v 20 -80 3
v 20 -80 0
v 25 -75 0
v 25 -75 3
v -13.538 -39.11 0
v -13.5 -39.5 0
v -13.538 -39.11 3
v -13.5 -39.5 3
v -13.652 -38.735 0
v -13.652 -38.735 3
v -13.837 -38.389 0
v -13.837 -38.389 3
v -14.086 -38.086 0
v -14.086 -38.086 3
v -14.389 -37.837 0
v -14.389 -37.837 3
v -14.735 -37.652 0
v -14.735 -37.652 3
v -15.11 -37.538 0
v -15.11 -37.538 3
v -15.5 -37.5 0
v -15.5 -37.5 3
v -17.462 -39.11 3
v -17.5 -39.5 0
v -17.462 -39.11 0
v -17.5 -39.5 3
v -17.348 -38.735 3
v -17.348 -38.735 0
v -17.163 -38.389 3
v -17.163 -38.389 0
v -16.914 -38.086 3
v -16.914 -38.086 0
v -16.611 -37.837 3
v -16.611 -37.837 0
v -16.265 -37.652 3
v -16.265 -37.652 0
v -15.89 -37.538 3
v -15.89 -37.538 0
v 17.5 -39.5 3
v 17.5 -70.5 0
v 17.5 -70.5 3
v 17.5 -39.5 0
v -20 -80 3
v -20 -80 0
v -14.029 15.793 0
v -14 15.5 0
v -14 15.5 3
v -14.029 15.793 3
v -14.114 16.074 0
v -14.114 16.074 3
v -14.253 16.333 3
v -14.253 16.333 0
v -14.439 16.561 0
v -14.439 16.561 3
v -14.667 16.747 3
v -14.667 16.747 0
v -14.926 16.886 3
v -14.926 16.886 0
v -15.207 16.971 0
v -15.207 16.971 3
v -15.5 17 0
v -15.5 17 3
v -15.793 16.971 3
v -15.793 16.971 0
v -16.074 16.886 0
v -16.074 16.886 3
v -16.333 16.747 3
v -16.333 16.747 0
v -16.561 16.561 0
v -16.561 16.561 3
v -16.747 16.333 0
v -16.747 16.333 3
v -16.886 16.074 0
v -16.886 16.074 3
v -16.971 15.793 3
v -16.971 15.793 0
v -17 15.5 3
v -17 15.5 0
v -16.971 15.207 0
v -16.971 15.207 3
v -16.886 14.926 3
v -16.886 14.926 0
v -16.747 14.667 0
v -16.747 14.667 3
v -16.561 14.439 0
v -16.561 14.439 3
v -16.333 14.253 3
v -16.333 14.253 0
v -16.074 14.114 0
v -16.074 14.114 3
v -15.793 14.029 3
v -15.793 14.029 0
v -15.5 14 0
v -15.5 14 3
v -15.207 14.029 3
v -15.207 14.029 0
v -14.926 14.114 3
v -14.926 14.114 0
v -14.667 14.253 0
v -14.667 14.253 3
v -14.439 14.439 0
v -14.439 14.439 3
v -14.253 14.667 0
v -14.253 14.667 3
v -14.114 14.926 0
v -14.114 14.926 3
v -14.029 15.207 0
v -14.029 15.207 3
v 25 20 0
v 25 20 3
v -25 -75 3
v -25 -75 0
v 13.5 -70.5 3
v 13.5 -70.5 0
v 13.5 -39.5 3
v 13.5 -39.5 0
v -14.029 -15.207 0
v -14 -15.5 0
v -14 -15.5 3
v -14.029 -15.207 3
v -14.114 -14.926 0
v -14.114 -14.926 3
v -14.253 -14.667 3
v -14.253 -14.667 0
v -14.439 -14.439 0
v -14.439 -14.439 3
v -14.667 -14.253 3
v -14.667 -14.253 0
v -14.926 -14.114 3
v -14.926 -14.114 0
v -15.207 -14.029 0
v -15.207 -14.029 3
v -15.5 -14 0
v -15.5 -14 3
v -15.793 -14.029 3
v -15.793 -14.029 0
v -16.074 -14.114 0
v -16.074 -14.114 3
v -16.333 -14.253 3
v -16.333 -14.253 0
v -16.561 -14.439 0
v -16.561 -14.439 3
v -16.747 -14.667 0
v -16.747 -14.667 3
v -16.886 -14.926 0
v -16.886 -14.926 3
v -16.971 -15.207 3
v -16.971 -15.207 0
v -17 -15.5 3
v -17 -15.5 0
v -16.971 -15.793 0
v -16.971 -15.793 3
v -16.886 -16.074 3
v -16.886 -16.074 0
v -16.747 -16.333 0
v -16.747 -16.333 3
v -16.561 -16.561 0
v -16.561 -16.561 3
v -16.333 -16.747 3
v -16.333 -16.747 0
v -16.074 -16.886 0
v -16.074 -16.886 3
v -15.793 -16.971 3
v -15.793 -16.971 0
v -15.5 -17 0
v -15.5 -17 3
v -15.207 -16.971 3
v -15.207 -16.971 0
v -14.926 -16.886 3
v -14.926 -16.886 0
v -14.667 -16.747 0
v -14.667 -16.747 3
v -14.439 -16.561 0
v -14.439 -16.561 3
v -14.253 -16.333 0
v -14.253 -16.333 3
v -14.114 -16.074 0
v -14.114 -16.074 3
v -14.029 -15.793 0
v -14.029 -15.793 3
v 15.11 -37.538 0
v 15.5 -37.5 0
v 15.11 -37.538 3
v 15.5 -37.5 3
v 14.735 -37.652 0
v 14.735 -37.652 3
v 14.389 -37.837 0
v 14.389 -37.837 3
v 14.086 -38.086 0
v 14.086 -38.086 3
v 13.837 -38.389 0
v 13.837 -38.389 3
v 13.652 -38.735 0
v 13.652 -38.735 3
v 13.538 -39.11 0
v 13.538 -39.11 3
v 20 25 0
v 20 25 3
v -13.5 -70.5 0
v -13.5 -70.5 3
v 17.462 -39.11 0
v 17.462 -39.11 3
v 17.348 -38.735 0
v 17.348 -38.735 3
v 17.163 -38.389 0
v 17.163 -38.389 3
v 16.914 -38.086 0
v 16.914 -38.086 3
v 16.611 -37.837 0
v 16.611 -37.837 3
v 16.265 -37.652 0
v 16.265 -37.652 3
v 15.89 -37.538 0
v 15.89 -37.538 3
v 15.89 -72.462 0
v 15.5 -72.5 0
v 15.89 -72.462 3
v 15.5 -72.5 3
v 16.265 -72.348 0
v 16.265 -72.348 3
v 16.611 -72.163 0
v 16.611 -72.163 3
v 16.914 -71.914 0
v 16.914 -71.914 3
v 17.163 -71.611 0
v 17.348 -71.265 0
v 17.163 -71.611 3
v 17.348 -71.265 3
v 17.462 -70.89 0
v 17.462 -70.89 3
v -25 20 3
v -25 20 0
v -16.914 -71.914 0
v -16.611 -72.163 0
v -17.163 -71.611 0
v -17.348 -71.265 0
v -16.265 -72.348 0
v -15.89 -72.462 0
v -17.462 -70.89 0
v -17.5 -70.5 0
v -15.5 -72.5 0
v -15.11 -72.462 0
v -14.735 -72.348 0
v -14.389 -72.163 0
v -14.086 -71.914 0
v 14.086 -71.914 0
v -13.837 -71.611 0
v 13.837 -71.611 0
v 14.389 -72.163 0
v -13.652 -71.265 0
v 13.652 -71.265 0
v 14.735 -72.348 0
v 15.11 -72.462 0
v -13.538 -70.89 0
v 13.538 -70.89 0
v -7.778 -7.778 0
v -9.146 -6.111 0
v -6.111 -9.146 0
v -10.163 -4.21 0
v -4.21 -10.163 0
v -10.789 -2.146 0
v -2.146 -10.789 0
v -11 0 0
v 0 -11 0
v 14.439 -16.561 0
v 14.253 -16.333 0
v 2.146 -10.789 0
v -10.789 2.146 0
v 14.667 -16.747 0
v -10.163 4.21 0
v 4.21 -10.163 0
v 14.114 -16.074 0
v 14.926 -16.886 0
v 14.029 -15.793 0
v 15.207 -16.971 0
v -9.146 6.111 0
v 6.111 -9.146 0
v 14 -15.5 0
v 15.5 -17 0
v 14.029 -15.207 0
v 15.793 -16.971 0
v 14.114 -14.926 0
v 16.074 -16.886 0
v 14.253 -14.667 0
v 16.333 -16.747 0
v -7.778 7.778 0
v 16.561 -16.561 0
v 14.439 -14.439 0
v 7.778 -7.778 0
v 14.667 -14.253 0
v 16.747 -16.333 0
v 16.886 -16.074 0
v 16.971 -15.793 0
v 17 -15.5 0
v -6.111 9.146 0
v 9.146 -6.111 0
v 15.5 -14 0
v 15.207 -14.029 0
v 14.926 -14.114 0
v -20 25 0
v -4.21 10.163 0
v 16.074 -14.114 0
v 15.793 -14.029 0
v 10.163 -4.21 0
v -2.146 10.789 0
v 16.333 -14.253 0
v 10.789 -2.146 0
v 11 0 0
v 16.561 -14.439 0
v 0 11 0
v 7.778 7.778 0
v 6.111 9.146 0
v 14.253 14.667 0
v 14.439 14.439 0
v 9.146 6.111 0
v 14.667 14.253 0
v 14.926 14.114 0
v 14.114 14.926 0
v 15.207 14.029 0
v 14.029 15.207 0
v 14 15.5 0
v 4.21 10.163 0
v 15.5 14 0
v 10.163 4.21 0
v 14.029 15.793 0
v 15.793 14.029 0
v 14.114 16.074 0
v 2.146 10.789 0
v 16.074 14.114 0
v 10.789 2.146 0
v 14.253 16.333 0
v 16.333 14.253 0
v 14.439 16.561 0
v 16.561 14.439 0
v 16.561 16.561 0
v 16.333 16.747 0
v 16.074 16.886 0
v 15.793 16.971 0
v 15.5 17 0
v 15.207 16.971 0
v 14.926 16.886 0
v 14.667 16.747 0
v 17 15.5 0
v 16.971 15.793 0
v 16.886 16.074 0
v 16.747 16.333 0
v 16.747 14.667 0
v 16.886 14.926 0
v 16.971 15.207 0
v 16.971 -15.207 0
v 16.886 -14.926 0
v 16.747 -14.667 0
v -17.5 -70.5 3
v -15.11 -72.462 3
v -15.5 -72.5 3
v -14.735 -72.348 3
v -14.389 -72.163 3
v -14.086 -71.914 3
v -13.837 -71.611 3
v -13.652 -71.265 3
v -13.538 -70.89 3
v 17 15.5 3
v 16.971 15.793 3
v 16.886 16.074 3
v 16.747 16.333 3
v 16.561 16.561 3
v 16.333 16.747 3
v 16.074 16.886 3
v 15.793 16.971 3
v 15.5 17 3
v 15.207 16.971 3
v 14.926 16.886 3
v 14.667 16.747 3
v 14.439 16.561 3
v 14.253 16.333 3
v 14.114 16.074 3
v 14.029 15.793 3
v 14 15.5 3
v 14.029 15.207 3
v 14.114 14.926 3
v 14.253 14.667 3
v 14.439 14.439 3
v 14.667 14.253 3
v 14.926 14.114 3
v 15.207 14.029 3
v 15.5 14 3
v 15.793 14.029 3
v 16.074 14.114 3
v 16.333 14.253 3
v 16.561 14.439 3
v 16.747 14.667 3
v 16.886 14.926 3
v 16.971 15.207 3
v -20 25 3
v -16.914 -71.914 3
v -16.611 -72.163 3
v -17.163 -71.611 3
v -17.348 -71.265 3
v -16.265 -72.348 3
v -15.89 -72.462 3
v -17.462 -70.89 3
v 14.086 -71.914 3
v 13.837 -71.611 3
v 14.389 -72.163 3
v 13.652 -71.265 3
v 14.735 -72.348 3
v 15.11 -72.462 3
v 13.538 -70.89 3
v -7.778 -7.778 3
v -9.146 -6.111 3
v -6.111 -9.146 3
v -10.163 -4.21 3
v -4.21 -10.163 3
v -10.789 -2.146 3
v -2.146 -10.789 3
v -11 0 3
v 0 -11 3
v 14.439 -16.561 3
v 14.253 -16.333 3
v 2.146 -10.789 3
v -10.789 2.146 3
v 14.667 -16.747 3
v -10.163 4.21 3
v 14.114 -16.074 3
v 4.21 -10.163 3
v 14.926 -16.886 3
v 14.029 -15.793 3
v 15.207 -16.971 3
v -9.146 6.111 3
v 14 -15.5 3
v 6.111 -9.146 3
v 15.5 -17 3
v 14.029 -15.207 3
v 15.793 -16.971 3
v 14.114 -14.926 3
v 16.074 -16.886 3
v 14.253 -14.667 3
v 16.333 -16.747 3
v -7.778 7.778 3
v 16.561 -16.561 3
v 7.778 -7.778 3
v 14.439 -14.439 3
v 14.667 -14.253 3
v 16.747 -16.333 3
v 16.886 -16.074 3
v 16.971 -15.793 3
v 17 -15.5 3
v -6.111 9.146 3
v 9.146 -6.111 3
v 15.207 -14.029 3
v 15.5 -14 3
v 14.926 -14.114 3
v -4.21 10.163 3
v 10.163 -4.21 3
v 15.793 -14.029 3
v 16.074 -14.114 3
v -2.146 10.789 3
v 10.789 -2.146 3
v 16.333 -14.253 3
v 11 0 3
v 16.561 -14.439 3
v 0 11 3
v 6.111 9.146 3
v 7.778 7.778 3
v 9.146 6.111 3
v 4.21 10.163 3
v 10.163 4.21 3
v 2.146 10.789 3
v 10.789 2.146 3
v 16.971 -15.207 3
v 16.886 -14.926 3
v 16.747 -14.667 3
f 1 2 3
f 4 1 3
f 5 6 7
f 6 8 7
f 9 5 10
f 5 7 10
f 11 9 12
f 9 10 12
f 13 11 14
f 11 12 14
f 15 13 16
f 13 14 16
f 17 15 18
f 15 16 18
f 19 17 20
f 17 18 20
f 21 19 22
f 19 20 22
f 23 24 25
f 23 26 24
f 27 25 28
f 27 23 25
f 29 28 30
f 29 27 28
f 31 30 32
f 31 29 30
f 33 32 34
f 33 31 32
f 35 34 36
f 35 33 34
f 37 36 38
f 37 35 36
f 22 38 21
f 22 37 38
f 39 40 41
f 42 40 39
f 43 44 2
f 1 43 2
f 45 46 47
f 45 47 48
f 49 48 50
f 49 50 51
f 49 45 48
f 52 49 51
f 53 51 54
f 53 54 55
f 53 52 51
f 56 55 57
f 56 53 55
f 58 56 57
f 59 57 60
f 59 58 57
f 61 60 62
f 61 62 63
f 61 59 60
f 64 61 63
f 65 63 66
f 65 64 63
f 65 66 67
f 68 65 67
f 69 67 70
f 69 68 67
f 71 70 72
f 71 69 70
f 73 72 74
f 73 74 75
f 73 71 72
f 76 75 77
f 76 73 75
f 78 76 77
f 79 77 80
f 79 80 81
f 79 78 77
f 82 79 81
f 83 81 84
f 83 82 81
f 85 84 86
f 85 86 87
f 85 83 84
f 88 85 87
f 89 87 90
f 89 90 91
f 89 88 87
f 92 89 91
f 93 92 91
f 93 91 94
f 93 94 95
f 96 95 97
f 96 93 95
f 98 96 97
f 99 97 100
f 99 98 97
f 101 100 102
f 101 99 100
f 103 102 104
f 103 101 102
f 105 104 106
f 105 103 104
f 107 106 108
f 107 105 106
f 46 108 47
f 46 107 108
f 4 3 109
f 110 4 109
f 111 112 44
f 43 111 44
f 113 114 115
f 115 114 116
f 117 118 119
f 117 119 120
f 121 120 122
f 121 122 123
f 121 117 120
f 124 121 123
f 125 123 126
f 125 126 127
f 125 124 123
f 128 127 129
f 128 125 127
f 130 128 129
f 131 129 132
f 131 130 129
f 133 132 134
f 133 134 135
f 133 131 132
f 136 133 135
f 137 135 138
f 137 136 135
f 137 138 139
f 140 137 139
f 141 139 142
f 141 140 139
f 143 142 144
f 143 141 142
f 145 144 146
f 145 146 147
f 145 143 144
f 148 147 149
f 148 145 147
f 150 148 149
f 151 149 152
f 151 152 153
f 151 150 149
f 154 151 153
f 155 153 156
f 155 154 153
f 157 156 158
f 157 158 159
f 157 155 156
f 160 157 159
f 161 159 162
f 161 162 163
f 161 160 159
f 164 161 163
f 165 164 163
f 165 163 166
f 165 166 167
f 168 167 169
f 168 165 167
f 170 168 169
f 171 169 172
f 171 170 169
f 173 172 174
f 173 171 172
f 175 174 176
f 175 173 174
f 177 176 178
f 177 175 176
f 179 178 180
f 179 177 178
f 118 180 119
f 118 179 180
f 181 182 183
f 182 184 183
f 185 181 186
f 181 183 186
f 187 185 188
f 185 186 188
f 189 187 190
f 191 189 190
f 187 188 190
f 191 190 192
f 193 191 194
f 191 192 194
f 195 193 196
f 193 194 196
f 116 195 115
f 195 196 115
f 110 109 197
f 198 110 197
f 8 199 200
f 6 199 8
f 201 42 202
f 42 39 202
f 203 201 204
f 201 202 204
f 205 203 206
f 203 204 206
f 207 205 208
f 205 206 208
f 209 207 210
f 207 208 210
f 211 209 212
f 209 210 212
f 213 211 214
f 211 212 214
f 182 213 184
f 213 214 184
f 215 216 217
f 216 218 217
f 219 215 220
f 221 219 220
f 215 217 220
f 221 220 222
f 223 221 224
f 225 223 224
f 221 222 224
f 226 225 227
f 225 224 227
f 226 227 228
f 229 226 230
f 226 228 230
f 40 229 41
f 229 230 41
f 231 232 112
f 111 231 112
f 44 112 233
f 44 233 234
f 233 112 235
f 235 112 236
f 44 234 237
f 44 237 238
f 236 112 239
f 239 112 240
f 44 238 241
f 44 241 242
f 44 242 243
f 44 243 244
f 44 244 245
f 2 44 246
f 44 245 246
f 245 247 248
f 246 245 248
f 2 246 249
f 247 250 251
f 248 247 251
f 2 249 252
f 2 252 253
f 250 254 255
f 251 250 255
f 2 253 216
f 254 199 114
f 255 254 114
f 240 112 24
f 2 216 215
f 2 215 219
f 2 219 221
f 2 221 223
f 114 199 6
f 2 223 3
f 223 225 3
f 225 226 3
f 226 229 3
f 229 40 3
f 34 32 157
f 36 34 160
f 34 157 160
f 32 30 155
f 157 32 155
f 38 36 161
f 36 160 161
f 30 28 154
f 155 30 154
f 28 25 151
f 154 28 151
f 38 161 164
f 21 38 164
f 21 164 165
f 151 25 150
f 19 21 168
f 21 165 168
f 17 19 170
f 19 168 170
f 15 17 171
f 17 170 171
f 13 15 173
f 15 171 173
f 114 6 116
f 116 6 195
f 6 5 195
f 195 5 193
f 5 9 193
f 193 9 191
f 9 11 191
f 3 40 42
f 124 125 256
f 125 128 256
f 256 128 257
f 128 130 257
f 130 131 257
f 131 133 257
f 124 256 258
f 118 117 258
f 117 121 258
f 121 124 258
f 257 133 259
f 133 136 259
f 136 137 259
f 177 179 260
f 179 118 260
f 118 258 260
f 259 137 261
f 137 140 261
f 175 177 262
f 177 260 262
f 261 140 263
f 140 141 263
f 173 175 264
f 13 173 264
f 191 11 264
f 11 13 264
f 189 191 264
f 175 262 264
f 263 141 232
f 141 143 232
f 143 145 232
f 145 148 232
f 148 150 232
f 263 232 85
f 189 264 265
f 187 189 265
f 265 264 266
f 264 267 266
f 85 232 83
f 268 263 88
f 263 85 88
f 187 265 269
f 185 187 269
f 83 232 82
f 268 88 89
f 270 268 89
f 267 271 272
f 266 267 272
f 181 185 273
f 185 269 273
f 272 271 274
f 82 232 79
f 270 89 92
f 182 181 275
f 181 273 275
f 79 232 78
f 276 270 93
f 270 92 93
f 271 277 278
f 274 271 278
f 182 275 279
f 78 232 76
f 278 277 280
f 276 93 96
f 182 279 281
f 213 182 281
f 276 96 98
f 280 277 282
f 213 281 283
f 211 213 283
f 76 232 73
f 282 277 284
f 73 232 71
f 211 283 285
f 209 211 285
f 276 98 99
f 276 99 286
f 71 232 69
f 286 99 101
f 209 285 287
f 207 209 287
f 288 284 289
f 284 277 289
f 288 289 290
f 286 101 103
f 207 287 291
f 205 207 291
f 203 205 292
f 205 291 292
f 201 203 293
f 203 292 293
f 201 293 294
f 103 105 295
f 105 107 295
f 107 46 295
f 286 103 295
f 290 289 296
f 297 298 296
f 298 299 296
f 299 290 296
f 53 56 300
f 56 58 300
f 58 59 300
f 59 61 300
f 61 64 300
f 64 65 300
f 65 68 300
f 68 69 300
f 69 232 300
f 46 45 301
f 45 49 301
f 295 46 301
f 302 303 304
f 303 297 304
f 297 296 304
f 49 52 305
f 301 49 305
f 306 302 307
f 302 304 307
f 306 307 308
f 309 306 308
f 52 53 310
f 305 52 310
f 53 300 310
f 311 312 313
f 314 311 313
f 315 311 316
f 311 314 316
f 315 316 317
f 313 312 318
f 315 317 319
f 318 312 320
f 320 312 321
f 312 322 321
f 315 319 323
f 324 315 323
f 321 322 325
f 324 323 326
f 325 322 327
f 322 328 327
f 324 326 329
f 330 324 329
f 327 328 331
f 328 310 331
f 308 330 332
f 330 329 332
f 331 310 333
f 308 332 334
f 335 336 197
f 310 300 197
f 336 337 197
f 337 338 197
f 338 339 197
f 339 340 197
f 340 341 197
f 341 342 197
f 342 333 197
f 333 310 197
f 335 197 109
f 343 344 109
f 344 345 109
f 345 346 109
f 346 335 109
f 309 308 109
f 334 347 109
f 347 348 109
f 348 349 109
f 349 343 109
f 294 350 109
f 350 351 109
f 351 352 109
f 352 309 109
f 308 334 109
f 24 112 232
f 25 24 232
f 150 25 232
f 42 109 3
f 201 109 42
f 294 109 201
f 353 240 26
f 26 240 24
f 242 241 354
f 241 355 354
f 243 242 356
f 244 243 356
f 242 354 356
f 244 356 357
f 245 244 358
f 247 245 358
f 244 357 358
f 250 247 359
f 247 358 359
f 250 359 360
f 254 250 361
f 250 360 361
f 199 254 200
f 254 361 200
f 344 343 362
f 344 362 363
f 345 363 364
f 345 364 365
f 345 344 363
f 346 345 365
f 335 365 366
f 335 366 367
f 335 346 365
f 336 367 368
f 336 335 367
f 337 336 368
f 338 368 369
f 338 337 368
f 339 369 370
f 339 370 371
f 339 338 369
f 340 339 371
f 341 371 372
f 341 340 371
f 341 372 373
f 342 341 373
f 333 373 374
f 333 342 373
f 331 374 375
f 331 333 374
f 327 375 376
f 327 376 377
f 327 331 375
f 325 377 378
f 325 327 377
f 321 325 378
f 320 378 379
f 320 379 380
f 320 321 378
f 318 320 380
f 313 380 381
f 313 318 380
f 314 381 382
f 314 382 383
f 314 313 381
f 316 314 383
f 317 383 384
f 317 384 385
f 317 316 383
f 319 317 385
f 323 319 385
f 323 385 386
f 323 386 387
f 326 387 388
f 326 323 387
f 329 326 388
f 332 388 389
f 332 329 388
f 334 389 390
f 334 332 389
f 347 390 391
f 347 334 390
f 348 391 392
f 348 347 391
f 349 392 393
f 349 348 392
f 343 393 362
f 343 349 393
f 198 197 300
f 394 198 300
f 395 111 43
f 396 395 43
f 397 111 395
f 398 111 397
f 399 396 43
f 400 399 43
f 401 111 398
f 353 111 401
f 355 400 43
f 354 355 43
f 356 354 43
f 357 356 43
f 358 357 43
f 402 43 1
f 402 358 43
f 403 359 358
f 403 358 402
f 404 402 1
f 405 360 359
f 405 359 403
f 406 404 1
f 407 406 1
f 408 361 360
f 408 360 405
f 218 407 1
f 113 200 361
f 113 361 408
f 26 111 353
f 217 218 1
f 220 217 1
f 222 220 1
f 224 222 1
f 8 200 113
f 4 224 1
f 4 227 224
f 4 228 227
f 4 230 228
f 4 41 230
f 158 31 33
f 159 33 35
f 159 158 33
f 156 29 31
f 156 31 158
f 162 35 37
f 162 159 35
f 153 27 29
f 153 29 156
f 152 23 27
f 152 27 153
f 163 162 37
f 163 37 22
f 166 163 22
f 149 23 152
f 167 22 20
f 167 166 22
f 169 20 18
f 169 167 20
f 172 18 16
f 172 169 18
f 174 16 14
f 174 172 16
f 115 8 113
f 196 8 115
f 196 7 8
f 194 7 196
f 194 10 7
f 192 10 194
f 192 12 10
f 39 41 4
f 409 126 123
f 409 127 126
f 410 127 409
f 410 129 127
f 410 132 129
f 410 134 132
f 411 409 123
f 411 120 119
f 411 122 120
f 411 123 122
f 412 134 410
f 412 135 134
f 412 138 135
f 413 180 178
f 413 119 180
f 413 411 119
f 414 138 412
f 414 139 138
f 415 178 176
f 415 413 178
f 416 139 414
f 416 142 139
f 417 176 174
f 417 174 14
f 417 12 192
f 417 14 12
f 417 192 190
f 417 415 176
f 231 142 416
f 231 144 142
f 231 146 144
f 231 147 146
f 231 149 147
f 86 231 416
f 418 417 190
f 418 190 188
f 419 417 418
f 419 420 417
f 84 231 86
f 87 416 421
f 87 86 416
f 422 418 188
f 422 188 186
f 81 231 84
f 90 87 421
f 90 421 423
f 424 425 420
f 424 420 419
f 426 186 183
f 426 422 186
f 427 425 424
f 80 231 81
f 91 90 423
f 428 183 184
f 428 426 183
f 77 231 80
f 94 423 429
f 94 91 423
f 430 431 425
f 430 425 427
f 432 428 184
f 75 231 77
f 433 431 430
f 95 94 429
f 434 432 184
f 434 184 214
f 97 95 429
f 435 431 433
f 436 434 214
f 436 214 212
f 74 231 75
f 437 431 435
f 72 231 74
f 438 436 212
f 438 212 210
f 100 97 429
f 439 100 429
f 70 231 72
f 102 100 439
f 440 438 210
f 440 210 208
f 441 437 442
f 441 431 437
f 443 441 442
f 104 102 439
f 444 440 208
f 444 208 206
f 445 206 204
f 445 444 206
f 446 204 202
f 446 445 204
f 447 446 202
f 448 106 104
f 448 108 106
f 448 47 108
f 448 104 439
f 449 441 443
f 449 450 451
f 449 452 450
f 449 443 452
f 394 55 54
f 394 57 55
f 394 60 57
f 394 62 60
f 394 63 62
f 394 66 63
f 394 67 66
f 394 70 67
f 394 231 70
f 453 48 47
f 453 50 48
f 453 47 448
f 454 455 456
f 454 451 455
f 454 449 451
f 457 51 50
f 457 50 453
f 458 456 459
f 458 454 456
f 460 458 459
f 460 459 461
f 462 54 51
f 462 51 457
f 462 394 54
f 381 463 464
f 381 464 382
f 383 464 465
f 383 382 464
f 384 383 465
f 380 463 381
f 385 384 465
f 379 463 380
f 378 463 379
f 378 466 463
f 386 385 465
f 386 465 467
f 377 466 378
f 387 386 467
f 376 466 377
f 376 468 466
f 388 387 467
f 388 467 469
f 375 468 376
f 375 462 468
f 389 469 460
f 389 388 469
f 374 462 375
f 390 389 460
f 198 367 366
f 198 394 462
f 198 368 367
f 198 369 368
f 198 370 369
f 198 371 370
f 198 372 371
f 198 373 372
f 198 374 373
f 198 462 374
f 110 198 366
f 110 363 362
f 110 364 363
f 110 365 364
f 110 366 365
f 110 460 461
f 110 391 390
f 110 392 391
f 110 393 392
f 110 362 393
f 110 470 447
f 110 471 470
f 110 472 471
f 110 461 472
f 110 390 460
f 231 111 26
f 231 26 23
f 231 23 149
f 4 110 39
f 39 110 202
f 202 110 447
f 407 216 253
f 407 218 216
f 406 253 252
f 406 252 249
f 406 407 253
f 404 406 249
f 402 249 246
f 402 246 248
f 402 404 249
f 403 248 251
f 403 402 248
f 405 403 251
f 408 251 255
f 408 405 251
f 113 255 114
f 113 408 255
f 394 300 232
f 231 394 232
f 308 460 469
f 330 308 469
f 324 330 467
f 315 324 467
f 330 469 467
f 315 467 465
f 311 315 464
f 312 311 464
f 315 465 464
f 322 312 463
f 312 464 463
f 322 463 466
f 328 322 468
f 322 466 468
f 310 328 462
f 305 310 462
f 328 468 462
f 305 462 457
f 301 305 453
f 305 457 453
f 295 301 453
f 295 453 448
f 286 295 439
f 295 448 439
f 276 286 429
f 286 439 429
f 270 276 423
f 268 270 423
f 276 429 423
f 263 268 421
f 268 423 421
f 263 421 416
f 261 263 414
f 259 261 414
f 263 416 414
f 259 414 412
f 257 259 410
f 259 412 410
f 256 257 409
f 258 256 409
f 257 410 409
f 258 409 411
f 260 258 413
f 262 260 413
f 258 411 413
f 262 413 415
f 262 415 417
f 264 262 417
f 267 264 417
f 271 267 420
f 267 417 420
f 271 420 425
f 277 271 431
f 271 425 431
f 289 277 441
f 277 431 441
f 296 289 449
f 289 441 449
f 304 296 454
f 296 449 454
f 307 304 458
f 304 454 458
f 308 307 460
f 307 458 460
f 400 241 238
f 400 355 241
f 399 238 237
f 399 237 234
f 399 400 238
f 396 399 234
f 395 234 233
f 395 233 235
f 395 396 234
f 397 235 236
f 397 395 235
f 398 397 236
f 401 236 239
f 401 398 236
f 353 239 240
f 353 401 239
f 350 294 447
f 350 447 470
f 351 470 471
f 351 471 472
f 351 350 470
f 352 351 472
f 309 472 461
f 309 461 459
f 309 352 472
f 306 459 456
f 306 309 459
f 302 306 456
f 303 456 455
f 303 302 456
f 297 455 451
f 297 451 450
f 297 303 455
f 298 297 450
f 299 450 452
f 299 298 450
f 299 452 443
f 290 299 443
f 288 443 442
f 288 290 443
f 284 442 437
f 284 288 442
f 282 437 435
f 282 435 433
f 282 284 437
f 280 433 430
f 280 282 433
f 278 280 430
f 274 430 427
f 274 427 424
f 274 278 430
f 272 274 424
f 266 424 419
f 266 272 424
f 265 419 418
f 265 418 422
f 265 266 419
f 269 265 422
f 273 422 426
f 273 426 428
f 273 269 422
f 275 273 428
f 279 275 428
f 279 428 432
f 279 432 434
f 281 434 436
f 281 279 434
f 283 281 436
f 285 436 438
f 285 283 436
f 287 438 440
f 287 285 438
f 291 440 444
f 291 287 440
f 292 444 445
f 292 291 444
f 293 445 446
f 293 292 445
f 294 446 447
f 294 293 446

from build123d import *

# Parameters (mm, degrees)
SKETCH_1_R          = 1.5
SKETCH_1_W          = 4
SKETCH_1_H          = 35
EXTRUDE_1_DEPTH     = 3
FILLET_1_R          = 2
SKETCH_2_R          = 11
CUT_EXTRUDE_1_DEPTH = 3


with BuildPart() as part:
    # 草图1 → 凸台-拉伸1 (new body)
    with BuildSketch(Plane.XY):
        Polygon((-20, 25), (-25, 20), (-25, -75), (-20, -80), (20, -80), (25, -75), (25, 20), (20, 25), align=None)
        with Locations((-15.5, 15.5)):
            Circle(SKETCH_1_R, mode=Mode.SUBTRACT)
        with Locations((15.5, 15.5)):
            Circle(SKETCH_1_R, mode=Mode.SUBTRACT)
        with Locations((15.5, -15.5)):
            Circle(SKETCH_1_R, mode=Mode.SUBTRACT)
        with Locations((-15.5, -15.5)):
            Circle(SKETCH_1_R, mode=Mode.SUBTRACT)
        with Locations((-15.5, -55)):
            Rectangle(SKETCH_1_W, SKETCH_1_H, mode=Mode.SUBTRACT)
        with Locations((15.5, -55)):
            Rectangle(SKETCH_1_W, SKETCH_1_H, mode=Mode.SUBTRACT)
    extrude(amount=EXTRUDE_1_DEPTH)

    # 圆角1
    fillet_1_edges = [part.edges().sort_by_distance(p)[0] for p in [
        (17.5, -72.5, 1.5),
        (-13.5, -72.5, 1.5),
        (13.5, -37.5, 1.5),
        (-17.5, -37.5, 1.5),
        (-17.5, -72.5, 1.5),
        (13.5, -72.5, 1.5),
        (17.5, -37.5, 1.5),
        (-13.5, -37.5, 1.5),
    ]]
    fillet(fillet_1_edges, radius=FILLET_1_R - 0.0001)  # a hair under: the kernel refuses the full size

    # 草图2 → 切除-拉伸1 (cut)
    with BuildSketch(Plane.XY.offset(3)):
        Circle(SKETCH_2_R)
    extrude(amount=-CUT_EXTRUDE_1_DEPTH, mode=Mode.SUBTRACT)


solid = part.part
